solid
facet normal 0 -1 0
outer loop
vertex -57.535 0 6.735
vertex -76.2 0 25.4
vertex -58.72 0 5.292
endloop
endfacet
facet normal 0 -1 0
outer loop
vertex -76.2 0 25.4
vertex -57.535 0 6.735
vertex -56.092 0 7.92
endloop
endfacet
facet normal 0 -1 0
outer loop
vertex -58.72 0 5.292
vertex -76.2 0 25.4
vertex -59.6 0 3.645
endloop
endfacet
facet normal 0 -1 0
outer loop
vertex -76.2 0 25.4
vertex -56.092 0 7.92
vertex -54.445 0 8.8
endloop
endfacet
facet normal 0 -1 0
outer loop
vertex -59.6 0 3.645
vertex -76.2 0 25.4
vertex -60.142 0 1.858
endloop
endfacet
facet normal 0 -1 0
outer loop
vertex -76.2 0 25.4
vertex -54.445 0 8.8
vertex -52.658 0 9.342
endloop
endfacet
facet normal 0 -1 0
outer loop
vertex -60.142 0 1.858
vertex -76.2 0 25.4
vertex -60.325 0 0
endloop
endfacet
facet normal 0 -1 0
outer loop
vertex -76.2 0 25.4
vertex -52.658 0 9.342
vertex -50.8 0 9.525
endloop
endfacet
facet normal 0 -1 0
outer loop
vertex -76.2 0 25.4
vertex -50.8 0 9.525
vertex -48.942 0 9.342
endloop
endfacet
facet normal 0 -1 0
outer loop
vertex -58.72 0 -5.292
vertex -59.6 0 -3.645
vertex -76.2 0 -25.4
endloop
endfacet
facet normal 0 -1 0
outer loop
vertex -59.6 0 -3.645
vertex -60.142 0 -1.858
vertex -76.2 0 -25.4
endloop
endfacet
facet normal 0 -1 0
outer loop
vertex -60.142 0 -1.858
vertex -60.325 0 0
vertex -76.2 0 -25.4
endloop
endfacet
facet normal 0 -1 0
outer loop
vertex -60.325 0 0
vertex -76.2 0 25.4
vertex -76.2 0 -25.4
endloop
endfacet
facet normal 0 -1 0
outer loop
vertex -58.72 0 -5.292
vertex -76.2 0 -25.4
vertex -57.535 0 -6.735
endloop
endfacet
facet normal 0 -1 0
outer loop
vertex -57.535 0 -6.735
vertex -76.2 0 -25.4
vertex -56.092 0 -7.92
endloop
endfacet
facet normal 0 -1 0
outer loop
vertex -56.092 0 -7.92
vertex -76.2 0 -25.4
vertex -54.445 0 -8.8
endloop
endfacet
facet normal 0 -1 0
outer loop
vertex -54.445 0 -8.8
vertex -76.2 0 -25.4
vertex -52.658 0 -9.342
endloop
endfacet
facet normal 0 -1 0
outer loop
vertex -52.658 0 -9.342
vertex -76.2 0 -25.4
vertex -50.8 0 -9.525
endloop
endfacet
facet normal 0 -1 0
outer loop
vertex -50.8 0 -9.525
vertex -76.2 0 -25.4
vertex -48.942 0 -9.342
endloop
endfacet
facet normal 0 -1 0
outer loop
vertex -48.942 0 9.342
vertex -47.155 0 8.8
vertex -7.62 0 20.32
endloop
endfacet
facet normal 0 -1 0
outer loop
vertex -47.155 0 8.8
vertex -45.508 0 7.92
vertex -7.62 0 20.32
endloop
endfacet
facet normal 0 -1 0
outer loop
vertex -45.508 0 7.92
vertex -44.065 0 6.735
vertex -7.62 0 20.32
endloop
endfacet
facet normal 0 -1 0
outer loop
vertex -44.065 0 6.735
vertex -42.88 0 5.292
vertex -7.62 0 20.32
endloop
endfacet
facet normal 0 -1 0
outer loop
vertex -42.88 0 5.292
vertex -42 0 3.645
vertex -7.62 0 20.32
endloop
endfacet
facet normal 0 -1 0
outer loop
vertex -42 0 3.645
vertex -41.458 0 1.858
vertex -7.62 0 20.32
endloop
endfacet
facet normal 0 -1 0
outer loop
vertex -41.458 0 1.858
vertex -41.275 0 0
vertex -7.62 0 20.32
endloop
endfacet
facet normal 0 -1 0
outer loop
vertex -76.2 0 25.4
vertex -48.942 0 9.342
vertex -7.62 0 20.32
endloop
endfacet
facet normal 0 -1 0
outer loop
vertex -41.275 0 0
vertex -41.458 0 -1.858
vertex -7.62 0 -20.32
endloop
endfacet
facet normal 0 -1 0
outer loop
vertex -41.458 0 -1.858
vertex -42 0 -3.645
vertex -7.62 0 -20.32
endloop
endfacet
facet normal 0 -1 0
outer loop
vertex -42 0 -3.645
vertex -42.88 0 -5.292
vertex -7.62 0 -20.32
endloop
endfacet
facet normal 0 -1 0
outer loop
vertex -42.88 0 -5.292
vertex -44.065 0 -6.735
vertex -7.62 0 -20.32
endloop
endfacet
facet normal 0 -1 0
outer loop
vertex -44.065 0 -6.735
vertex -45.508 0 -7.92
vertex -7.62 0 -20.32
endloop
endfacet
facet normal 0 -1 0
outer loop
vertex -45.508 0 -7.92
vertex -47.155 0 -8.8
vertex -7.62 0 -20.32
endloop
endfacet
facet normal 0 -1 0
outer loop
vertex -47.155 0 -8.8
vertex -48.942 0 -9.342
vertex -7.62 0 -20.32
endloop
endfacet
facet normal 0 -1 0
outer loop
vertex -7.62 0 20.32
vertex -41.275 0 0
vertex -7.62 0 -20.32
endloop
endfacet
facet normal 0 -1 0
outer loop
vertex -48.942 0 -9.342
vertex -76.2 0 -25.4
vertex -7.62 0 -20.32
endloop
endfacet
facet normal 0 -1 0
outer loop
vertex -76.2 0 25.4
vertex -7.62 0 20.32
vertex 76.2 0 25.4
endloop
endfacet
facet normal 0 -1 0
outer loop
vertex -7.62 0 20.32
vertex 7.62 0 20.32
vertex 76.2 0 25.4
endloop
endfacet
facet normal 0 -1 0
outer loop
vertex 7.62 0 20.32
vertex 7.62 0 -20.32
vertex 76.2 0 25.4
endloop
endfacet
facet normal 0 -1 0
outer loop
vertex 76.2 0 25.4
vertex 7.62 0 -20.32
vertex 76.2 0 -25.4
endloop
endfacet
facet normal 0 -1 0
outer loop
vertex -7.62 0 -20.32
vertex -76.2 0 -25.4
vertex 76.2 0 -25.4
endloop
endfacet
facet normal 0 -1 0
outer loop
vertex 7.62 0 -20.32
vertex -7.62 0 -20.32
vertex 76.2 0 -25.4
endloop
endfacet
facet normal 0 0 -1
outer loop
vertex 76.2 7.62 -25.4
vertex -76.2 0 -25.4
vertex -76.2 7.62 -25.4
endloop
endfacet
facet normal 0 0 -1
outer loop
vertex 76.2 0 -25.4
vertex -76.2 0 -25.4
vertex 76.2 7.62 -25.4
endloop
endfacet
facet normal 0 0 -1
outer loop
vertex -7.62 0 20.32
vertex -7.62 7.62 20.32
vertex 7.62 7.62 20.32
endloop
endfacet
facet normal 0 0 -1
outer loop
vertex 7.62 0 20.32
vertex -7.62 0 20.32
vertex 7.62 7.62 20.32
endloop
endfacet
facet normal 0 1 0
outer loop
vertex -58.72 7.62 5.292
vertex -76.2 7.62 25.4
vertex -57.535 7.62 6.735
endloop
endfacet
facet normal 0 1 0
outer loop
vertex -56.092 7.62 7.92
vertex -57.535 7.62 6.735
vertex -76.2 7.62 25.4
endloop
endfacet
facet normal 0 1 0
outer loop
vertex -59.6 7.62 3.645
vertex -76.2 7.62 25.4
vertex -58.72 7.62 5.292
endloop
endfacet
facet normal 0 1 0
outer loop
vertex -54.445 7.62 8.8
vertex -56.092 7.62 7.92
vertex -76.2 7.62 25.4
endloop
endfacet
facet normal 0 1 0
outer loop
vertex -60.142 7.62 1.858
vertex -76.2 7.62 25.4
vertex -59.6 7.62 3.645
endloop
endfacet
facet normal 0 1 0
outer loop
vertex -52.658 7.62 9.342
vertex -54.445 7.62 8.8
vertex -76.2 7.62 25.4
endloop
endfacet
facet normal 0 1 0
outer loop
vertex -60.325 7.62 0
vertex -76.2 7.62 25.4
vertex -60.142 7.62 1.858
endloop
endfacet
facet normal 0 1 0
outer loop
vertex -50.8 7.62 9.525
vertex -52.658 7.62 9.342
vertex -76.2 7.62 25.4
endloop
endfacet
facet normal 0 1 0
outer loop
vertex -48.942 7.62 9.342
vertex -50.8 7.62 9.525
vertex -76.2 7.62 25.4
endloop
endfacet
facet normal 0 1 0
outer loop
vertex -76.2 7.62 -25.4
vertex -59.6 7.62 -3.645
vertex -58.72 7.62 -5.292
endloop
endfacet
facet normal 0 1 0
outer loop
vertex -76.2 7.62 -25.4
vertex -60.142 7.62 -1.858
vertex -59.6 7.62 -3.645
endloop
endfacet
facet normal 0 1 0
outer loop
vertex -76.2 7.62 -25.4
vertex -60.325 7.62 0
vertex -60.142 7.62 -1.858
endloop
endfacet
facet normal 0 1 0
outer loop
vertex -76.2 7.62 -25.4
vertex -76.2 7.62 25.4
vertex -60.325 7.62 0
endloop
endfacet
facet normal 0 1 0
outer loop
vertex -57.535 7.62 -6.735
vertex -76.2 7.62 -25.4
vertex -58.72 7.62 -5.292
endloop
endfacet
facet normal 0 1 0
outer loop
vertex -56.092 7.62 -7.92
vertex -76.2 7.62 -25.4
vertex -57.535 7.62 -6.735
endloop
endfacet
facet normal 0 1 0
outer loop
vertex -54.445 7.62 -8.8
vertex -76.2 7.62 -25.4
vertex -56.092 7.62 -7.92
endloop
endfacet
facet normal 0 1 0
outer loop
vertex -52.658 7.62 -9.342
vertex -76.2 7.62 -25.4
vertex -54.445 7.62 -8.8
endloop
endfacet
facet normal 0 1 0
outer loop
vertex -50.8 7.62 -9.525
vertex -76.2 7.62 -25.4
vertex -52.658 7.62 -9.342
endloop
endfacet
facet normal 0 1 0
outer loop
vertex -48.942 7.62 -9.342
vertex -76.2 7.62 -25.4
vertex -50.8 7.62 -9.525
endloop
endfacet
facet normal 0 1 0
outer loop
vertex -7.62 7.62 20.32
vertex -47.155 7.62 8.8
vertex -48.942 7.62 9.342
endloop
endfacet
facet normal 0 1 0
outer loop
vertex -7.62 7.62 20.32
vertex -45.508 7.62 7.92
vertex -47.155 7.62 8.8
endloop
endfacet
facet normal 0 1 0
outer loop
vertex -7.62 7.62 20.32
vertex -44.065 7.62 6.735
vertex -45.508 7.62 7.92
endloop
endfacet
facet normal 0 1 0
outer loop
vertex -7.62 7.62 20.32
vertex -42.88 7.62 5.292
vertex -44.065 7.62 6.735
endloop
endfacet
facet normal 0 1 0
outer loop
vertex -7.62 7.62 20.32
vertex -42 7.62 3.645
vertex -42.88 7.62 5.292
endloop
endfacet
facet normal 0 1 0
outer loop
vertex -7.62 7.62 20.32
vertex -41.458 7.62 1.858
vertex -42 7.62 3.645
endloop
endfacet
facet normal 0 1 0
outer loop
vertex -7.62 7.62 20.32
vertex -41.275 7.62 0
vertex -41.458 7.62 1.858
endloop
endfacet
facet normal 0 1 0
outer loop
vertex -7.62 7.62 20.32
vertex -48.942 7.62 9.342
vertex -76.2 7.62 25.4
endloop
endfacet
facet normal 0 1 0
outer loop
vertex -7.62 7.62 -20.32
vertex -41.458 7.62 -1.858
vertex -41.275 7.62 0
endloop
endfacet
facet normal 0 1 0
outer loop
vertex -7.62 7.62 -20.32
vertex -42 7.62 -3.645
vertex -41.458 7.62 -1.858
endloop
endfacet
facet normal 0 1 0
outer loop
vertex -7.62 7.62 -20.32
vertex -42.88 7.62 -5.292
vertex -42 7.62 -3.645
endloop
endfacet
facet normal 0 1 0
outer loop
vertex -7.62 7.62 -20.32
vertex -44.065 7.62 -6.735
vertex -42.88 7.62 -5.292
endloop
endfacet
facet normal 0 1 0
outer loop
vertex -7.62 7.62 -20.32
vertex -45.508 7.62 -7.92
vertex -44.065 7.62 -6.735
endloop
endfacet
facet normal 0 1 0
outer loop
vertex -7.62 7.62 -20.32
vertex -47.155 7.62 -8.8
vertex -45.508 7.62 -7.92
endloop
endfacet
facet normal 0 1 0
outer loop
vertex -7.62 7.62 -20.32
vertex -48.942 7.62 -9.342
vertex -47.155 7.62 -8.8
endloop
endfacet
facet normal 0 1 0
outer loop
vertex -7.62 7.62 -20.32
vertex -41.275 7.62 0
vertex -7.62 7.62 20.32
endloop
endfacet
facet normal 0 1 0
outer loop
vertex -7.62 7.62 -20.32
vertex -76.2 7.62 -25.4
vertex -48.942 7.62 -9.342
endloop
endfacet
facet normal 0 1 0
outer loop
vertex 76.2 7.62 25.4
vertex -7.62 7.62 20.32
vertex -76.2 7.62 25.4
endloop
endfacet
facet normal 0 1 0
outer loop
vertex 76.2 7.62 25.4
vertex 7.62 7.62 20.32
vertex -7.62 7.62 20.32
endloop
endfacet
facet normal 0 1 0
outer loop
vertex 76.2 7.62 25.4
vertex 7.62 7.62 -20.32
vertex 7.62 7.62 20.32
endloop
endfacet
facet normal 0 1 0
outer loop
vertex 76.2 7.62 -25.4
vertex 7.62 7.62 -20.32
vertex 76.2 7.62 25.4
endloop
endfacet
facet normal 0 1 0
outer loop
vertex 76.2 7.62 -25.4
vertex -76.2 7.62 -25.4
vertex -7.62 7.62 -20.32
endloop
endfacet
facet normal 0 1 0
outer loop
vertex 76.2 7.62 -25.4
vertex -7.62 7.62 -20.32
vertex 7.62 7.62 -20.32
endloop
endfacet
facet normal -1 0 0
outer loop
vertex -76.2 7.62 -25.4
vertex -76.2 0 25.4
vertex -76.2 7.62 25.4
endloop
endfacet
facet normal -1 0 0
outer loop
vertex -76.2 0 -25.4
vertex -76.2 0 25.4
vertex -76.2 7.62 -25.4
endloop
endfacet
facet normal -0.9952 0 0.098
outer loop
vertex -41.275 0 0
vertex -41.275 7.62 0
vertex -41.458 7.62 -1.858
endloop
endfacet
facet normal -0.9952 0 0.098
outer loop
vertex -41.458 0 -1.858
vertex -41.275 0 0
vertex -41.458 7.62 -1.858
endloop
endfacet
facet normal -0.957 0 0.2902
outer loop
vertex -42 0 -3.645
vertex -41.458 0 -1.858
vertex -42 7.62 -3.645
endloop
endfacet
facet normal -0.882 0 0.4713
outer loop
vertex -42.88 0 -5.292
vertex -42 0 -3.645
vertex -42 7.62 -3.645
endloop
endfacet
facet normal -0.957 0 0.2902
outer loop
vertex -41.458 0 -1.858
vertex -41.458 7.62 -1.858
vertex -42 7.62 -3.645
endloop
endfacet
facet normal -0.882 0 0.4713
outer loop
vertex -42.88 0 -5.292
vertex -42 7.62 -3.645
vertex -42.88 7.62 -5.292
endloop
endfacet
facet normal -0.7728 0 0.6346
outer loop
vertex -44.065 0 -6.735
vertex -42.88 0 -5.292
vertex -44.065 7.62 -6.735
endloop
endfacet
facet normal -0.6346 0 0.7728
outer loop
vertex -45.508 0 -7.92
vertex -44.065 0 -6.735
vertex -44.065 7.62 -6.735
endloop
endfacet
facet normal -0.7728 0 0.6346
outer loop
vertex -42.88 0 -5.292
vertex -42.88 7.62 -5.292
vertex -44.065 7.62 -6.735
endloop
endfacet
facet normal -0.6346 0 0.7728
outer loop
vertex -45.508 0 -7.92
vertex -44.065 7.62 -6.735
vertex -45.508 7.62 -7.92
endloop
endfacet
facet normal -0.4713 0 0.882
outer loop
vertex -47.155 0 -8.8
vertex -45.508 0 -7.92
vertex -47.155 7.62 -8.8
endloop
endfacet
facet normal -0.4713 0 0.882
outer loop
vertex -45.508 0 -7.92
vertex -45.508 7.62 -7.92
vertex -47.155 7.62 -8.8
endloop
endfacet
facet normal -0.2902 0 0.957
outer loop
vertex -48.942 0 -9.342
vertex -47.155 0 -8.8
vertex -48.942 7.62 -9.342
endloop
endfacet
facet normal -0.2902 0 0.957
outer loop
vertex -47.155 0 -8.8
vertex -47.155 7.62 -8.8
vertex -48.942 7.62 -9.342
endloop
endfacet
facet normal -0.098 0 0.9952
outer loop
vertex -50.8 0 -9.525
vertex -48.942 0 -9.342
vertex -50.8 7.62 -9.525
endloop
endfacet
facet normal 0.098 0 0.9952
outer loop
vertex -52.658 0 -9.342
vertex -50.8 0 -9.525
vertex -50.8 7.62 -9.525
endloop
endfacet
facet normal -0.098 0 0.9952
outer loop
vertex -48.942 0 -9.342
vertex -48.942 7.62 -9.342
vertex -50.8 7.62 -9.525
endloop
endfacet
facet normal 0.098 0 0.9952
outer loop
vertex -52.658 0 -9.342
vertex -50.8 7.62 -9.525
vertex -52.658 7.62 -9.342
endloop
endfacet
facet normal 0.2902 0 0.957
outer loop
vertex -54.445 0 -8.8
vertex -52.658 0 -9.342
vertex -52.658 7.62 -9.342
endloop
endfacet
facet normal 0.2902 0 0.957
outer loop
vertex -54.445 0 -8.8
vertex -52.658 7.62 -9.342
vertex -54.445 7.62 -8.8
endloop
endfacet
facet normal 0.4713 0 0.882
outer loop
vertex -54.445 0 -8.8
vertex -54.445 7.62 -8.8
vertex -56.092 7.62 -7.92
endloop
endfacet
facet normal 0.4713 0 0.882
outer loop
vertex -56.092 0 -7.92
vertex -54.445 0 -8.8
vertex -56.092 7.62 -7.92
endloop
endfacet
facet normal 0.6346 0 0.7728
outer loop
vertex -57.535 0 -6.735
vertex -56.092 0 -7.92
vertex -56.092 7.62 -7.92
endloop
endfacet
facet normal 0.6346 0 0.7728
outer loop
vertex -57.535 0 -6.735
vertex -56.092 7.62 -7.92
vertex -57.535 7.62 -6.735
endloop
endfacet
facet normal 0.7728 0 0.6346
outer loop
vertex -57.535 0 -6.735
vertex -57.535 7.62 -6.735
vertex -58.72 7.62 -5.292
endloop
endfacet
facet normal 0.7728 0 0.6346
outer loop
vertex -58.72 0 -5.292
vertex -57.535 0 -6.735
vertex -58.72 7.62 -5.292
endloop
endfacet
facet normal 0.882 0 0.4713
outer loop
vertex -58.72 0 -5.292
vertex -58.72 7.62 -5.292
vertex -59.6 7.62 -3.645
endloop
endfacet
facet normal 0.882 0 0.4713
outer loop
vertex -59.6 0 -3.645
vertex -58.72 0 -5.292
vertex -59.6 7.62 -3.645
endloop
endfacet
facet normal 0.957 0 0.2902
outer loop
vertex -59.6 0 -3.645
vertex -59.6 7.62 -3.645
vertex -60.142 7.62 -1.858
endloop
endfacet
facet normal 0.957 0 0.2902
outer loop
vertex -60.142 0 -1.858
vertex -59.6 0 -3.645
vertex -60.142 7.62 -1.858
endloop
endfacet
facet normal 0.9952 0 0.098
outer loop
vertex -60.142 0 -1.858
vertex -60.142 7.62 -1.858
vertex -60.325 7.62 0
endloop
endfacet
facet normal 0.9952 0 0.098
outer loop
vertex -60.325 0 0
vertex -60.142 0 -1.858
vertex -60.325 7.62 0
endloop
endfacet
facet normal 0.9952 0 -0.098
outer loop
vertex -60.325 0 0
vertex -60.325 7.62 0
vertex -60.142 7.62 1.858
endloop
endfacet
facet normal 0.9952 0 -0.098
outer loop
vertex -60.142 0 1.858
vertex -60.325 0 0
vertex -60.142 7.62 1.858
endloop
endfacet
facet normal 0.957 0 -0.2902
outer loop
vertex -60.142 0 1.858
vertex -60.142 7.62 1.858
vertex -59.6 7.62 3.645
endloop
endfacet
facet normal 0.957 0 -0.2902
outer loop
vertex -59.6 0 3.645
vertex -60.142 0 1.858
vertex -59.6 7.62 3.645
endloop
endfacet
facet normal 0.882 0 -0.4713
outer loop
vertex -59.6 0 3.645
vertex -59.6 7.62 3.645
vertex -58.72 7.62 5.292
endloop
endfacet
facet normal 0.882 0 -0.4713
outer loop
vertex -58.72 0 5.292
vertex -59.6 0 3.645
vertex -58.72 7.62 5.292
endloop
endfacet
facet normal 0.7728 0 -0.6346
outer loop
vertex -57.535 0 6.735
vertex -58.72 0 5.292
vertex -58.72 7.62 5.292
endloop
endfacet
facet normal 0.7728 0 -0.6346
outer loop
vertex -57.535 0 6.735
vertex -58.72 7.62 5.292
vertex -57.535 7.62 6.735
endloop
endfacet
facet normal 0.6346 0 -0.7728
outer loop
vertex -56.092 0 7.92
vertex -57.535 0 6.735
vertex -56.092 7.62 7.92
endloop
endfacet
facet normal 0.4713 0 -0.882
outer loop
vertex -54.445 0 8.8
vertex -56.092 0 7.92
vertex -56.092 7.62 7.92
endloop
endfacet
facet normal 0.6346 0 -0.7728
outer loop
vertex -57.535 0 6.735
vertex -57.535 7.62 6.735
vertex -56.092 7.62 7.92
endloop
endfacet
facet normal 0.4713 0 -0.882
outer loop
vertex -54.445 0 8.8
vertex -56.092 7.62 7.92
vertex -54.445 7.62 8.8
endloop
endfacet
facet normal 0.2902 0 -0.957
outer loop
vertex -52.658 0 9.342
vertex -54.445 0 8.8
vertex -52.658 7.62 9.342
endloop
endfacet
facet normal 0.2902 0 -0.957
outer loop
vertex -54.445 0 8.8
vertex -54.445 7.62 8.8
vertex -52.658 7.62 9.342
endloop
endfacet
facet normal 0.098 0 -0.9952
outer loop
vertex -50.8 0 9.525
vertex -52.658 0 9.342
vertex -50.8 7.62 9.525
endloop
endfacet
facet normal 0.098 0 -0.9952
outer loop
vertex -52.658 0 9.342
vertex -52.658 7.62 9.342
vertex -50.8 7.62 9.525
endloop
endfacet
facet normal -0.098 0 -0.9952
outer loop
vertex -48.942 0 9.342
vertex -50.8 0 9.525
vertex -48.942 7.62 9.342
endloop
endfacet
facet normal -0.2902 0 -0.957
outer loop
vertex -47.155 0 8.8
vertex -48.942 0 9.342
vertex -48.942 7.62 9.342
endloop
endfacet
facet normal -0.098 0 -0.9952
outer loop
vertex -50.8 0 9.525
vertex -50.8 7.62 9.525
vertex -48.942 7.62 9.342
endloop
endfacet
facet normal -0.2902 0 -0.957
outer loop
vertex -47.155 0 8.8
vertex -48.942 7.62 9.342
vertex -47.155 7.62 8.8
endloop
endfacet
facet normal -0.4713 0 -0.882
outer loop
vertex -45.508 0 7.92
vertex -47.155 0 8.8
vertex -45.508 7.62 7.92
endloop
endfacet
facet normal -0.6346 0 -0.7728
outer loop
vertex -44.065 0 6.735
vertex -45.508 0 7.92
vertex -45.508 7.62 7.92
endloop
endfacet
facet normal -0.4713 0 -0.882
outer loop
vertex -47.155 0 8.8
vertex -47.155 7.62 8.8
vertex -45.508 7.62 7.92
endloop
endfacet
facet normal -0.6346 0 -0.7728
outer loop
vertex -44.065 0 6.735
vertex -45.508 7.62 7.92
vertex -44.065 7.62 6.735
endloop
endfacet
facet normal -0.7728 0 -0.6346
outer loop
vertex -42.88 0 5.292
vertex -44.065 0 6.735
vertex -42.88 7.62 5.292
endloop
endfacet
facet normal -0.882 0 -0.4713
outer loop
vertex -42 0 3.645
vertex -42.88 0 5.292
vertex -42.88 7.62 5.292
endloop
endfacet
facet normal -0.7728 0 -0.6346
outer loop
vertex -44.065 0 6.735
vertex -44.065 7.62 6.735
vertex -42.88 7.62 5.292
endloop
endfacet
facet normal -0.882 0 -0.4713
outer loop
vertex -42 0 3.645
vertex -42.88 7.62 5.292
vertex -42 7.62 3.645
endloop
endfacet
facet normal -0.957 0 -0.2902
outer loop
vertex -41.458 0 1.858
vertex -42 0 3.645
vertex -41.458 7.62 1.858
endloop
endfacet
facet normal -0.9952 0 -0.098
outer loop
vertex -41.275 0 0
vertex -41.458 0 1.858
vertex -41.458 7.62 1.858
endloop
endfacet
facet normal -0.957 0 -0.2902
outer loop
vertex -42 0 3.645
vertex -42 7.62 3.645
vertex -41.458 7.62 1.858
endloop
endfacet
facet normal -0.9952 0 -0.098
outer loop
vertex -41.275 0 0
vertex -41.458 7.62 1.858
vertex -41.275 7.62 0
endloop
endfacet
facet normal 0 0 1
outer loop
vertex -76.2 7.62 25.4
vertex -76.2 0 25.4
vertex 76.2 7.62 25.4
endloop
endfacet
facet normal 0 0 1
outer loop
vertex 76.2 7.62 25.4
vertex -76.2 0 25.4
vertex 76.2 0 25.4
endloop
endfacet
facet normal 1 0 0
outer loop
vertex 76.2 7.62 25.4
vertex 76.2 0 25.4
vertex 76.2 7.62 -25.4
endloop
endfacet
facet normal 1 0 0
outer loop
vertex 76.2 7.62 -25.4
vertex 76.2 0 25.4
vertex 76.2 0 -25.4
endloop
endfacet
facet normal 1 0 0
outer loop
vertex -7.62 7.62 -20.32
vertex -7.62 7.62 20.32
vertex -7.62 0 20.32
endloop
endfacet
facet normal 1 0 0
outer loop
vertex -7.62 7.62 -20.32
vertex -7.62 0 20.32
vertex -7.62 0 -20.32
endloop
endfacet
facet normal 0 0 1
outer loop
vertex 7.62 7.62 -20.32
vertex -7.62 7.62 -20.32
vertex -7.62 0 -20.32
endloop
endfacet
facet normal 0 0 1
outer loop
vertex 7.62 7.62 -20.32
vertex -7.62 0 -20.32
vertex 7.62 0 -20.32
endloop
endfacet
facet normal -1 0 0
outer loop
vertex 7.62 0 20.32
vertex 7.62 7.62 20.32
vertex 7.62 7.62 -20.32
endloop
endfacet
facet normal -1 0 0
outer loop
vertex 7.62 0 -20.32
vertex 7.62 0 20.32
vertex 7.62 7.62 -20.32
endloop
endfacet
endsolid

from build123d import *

# Parameters (mm, degrees)
SKETCH1_W           = 152.4
SKETCH1_H           = 50.8
BOSS_EXTRUDE1_DEPTH = 7.62
SKETCH3_R           = 9.525
CUT_EXTRUDE2_DEPTH  = 8.62
SKETCH5_W           = 15.24
SKETCH5_H           = 40.64
CUT_EXTRUDE4_DEPTH  = 8.62


with BuildPart() as part:
    # Sketch1 → Boss-Extrude1 (new body)
    with BuildSketch(Plane(origin=(0, 0, 0), x_dir=(1, 0, 0), z_dir=(0, 1, 0))):
        Rectangle(SKETCH1_W, SKETCH1_H)
    extrude(amount=BOSS_EXTRUDE1_DEPTH)

    # Sketch3 → Cut-Extrude2 (cut, through all)
    with BuildSketch(Plane(origin=(0, 7.62, 0), x_dir=(1, 0, 0), z_dir=(0, 1, 0))):
        with Locations((-50.8, 0)):
            Circle(SKETCH3_R)
    extrude(amount=-CUT_EXTRUDE2_DEPTH, mode=Mode.SUBTRACT)

    # Sketch5 → Cut-Extrude4 (cut, through all)
    with BuildSketch(Plane(origin=(0, 7.62, 0), x_dir=(1, 0, 0), z_dir=(0, 1, 0))):
        Rectangle(SKETCH5_W, SKETCH5_H)
    extrude(amount=-CUT_EXTRUDE4_DEPTH, mode=Mode.SUBTRACT)


solid = part.part
